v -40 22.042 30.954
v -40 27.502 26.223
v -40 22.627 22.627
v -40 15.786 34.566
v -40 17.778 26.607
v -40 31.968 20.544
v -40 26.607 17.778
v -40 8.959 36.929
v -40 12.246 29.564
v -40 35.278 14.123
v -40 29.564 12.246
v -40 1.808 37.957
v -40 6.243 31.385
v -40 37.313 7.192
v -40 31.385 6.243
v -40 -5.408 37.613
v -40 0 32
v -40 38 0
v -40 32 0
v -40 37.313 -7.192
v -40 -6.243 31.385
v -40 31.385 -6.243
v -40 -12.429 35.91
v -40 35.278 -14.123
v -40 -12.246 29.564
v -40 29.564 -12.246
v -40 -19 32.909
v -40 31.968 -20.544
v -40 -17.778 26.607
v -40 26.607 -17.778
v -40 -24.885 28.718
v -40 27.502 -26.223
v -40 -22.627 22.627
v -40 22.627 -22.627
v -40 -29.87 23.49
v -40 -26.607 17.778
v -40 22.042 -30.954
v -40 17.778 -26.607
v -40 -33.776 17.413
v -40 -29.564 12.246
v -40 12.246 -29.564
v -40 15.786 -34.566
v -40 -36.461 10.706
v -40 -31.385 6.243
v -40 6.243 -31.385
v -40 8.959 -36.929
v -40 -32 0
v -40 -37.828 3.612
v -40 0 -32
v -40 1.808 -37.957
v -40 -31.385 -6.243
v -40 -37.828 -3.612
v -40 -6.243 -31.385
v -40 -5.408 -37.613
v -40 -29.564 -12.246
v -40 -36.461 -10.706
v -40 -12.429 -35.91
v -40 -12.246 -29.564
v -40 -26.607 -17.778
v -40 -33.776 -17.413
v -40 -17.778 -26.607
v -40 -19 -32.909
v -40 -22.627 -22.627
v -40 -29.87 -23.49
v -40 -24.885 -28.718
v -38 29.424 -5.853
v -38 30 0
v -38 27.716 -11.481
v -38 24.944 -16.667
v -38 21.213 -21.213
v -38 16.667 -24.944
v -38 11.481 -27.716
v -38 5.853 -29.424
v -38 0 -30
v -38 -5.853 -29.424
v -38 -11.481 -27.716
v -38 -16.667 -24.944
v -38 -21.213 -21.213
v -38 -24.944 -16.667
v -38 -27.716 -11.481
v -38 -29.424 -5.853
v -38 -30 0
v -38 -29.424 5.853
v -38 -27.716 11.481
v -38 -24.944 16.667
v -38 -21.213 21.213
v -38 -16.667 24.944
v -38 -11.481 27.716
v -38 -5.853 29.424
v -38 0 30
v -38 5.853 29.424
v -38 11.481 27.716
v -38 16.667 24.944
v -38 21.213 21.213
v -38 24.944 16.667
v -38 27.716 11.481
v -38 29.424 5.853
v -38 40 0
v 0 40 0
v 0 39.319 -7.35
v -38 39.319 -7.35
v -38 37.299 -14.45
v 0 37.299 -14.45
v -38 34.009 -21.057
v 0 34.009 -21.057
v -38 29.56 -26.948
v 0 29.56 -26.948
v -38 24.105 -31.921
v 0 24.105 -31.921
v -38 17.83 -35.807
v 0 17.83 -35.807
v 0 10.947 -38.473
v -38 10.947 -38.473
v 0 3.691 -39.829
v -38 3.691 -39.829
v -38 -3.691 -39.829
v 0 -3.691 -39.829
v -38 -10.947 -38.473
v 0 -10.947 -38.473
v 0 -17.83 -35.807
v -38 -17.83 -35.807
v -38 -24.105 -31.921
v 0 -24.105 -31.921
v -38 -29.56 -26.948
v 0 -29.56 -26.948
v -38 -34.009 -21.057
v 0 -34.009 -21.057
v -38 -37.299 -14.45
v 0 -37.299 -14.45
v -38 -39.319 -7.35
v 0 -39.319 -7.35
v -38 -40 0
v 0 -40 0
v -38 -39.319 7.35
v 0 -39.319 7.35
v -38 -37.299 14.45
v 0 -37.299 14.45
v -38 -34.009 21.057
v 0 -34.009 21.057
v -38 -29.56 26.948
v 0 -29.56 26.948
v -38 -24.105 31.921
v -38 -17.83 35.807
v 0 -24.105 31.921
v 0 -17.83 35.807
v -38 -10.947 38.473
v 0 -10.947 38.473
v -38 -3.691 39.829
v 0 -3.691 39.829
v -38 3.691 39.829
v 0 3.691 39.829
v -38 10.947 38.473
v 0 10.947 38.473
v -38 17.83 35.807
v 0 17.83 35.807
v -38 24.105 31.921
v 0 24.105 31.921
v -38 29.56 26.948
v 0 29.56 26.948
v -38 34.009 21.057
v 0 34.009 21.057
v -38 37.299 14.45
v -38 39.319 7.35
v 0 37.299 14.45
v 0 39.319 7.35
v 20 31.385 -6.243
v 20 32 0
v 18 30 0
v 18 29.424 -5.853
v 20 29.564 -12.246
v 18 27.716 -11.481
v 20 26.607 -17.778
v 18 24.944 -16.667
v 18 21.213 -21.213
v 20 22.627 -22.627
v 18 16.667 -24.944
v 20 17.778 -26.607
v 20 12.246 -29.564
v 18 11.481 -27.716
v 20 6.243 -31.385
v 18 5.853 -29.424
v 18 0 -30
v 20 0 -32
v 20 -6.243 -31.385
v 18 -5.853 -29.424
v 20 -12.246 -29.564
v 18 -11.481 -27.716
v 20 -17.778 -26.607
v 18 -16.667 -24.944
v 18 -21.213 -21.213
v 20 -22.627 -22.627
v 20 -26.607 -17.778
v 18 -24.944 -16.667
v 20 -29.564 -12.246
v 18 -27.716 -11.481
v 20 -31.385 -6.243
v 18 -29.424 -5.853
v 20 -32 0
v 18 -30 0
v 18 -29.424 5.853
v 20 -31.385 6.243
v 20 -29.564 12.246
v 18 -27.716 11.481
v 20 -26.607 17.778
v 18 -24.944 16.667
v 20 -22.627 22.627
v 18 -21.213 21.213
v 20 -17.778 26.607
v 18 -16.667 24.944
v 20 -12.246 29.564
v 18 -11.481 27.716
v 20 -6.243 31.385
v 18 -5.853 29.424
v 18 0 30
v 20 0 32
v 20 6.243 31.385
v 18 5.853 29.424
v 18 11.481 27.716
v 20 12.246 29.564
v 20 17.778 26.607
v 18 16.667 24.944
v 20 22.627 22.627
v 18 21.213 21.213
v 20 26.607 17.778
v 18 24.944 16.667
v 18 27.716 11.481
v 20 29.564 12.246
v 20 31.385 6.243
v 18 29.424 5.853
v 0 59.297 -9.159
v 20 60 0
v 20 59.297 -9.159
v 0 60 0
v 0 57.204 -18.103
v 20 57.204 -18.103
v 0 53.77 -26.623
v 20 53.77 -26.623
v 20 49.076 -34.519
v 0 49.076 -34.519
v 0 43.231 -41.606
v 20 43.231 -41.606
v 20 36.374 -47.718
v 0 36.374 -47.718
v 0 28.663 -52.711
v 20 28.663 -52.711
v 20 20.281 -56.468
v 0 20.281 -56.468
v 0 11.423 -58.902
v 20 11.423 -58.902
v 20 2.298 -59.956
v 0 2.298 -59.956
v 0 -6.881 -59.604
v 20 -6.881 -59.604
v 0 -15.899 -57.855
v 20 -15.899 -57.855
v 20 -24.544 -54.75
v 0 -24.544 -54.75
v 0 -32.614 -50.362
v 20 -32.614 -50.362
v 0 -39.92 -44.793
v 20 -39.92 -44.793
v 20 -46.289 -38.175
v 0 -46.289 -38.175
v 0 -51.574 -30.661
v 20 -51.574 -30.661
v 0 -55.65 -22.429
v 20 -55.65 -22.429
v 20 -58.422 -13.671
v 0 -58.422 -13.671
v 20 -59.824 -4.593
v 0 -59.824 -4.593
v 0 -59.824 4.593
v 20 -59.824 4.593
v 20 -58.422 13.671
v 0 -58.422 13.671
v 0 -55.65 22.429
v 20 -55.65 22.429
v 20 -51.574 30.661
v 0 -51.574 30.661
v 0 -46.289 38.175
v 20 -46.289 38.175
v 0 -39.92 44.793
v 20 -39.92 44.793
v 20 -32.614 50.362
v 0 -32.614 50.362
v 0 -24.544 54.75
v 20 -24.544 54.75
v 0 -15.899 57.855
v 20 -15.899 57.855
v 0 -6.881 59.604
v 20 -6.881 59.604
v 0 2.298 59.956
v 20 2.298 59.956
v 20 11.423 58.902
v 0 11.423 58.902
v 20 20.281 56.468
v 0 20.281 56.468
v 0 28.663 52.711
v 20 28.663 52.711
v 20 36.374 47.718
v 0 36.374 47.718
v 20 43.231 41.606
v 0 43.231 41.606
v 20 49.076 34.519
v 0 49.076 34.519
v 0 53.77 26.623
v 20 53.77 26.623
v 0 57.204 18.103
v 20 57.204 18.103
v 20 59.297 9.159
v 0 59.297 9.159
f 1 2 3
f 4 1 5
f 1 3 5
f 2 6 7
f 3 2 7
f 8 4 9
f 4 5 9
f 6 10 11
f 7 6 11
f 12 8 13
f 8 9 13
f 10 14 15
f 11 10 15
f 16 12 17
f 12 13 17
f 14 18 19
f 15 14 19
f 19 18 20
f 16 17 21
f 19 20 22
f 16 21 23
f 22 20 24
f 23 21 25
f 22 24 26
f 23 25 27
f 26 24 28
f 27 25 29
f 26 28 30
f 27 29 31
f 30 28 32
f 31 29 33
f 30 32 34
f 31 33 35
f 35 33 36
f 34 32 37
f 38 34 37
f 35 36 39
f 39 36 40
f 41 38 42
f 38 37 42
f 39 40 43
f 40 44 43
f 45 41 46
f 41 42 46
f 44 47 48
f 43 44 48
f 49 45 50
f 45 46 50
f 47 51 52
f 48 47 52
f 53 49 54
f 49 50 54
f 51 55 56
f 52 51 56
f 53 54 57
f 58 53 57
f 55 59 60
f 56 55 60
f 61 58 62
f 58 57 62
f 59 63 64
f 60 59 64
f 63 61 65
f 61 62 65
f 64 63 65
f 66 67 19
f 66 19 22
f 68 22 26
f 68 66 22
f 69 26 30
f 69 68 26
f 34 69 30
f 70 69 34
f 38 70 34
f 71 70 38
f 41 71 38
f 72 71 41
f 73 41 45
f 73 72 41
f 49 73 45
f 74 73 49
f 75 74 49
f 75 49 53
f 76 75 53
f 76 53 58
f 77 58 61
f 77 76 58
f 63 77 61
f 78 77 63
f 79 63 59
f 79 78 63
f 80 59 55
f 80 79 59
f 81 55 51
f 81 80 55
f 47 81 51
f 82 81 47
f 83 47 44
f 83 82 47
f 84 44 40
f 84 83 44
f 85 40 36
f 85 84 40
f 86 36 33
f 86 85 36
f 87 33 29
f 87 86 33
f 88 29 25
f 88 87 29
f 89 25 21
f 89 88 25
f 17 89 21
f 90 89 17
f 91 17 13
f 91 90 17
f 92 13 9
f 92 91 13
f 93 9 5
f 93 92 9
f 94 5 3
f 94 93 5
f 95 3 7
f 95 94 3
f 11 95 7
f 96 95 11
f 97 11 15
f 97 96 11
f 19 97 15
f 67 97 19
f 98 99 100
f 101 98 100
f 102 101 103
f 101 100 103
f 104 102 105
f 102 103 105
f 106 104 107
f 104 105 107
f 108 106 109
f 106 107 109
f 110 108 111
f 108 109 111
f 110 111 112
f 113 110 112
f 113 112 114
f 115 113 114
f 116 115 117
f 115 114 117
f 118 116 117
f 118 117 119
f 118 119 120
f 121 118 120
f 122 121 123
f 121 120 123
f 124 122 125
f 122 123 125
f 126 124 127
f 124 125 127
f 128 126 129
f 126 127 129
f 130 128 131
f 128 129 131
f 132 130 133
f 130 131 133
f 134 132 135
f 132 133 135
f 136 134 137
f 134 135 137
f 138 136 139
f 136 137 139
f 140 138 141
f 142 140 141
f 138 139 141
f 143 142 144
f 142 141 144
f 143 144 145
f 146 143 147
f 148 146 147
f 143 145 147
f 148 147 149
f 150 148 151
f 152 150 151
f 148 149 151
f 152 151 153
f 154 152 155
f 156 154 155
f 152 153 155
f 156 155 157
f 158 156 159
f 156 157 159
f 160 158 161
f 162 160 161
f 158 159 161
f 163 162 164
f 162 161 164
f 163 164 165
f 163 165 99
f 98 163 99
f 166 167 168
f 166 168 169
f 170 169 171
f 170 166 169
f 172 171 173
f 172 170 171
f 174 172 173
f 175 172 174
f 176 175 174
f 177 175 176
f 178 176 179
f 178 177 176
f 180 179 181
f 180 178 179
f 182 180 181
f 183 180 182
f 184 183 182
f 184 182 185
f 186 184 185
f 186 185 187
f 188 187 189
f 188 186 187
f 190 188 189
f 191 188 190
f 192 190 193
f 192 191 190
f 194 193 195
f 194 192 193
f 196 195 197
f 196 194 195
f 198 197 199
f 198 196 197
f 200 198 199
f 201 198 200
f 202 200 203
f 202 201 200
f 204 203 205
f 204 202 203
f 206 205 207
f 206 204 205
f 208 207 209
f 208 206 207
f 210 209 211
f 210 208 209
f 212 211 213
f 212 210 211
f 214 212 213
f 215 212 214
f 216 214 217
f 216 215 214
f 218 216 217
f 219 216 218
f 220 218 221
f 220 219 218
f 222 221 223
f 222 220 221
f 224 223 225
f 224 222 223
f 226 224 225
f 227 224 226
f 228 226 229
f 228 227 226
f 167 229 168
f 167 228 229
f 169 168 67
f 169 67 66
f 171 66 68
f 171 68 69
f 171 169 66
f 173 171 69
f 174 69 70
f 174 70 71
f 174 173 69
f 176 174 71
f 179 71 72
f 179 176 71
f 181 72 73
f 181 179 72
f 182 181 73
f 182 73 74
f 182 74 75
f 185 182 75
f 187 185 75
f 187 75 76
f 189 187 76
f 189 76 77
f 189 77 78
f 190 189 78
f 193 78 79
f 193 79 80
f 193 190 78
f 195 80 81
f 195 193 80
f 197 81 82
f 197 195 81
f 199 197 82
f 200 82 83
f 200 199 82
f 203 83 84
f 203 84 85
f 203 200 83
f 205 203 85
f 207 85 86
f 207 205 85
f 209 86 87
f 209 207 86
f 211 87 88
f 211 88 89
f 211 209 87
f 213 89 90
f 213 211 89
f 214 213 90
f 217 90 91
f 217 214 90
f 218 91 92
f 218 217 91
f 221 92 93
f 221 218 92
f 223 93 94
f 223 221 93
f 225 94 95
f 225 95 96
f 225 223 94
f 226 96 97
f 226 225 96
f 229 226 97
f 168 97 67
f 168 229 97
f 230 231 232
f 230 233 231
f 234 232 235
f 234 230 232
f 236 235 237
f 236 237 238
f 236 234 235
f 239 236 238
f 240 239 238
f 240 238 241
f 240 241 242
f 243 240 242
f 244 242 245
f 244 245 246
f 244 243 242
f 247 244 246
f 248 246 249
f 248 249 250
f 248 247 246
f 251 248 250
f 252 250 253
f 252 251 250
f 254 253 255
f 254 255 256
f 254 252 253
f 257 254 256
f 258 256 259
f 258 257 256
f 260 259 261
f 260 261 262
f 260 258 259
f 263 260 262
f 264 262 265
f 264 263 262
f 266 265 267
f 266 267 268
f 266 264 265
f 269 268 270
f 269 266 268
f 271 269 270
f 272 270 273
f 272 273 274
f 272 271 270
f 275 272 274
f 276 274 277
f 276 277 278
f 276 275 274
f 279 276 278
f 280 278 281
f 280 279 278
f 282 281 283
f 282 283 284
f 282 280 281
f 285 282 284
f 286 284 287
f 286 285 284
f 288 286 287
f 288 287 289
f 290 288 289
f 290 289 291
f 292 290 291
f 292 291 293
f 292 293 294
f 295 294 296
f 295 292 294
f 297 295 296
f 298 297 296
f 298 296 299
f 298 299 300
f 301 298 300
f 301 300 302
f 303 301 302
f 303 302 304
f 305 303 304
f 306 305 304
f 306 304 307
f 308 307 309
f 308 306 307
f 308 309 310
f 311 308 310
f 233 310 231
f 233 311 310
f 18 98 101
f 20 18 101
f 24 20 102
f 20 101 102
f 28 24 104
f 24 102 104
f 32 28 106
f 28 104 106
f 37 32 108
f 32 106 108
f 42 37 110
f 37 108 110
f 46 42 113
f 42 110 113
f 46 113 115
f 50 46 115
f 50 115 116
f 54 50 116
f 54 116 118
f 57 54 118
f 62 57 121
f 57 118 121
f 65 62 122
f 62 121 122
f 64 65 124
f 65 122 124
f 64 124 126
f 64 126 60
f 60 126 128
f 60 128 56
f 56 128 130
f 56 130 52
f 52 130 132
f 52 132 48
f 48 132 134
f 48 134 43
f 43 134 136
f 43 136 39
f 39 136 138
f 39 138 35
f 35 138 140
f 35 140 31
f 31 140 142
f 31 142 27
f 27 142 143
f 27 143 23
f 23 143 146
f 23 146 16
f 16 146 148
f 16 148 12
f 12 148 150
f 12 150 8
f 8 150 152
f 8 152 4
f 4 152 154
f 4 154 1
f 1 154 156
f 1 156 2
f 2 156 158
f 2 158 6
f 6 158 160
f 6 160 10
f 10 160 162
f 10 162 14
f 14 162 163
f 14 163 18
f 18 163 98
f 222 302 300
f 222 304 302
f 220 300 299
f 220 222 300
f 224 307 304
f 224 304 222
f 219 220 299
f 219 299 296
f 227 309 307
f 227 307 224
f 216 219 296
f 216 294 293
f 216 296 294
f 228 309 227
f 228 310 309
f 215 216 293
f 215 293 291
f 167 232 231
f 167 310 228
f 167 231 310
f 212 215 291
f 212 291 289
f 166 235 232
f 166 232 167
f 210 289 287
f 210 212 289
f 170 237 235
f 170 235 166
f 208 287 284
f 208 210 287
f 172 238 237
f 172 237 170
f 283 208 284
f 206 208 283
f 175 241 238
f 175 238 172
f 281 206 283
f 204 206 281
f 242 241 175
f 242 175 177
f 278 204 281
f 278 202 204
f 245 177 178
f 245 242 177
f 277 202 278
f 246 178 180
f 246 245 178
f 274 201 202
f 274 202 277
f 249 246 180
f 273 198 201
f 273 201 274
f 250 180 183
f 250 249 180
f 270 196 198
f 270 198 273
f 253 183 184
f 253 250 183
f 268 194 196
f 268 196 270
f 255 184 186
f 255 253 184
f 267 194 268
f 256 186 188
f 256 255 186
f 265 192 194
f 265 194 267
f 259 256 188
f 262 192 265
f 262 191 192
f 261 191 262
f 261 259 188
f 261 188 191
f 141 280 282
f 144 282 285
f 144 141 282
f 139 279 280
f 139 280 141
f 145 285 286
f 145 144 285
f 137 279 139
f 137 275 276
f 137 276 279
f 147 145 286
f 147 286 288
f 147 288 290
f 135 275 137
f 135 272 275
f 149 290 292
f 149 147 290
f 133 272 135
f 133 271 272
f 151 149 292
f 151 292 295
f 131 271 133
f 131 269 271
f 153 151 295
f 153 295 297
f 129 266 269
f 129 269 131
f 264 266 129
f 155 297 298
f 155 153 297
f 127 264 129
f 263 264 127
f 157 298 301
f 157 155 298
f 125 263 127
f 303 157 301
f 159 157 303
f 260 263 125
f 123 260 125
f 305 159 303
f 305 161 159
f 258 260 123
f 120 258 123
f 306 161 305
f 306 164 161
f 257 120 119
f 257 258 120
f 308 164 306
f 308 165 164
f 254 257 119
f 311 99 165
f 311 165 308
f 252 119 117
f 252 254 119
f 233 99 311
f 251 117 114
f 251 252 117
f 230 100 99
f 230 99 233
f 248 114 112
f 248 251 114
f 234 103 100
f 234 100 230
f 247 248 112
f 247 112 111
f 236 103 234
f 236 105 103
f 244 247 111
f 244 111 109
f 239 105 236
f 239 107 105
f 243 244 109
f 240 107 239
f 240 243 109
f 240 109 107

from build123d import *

# Parameters (mm, degrees)
ESQUISSE1_W     = 40
ESQUISSE1_H     = 10
CHANFREIN1_SIZE = 2


with BuildPart() as part:
    # Esquisse1 → Révolution1 (revolve)
    with BuildSketch(Plane.XY):
        with Locations((-20, 35)):
            Rectangle(ESQUISSE1_W, ESQUISSE1_H)
        Polygon((0, 40), (0, 30), (20, 30), (20, 60), (0, 60), align=None)
    revolve(axis=Axis((0, 0, 0), (-1, 0, 0)))

    # Chanfrein1
    chanfrein1_edges = [part.edges().sort_by_distance(p)[0] for p in [
        (-40, -40, 0),
        (20, -30, 0),
        (-40, -30, 0),
    ]]
    chamfer(chanfrein1_edges, length=CHANFREIN1_SIZE)


solid = part.part
